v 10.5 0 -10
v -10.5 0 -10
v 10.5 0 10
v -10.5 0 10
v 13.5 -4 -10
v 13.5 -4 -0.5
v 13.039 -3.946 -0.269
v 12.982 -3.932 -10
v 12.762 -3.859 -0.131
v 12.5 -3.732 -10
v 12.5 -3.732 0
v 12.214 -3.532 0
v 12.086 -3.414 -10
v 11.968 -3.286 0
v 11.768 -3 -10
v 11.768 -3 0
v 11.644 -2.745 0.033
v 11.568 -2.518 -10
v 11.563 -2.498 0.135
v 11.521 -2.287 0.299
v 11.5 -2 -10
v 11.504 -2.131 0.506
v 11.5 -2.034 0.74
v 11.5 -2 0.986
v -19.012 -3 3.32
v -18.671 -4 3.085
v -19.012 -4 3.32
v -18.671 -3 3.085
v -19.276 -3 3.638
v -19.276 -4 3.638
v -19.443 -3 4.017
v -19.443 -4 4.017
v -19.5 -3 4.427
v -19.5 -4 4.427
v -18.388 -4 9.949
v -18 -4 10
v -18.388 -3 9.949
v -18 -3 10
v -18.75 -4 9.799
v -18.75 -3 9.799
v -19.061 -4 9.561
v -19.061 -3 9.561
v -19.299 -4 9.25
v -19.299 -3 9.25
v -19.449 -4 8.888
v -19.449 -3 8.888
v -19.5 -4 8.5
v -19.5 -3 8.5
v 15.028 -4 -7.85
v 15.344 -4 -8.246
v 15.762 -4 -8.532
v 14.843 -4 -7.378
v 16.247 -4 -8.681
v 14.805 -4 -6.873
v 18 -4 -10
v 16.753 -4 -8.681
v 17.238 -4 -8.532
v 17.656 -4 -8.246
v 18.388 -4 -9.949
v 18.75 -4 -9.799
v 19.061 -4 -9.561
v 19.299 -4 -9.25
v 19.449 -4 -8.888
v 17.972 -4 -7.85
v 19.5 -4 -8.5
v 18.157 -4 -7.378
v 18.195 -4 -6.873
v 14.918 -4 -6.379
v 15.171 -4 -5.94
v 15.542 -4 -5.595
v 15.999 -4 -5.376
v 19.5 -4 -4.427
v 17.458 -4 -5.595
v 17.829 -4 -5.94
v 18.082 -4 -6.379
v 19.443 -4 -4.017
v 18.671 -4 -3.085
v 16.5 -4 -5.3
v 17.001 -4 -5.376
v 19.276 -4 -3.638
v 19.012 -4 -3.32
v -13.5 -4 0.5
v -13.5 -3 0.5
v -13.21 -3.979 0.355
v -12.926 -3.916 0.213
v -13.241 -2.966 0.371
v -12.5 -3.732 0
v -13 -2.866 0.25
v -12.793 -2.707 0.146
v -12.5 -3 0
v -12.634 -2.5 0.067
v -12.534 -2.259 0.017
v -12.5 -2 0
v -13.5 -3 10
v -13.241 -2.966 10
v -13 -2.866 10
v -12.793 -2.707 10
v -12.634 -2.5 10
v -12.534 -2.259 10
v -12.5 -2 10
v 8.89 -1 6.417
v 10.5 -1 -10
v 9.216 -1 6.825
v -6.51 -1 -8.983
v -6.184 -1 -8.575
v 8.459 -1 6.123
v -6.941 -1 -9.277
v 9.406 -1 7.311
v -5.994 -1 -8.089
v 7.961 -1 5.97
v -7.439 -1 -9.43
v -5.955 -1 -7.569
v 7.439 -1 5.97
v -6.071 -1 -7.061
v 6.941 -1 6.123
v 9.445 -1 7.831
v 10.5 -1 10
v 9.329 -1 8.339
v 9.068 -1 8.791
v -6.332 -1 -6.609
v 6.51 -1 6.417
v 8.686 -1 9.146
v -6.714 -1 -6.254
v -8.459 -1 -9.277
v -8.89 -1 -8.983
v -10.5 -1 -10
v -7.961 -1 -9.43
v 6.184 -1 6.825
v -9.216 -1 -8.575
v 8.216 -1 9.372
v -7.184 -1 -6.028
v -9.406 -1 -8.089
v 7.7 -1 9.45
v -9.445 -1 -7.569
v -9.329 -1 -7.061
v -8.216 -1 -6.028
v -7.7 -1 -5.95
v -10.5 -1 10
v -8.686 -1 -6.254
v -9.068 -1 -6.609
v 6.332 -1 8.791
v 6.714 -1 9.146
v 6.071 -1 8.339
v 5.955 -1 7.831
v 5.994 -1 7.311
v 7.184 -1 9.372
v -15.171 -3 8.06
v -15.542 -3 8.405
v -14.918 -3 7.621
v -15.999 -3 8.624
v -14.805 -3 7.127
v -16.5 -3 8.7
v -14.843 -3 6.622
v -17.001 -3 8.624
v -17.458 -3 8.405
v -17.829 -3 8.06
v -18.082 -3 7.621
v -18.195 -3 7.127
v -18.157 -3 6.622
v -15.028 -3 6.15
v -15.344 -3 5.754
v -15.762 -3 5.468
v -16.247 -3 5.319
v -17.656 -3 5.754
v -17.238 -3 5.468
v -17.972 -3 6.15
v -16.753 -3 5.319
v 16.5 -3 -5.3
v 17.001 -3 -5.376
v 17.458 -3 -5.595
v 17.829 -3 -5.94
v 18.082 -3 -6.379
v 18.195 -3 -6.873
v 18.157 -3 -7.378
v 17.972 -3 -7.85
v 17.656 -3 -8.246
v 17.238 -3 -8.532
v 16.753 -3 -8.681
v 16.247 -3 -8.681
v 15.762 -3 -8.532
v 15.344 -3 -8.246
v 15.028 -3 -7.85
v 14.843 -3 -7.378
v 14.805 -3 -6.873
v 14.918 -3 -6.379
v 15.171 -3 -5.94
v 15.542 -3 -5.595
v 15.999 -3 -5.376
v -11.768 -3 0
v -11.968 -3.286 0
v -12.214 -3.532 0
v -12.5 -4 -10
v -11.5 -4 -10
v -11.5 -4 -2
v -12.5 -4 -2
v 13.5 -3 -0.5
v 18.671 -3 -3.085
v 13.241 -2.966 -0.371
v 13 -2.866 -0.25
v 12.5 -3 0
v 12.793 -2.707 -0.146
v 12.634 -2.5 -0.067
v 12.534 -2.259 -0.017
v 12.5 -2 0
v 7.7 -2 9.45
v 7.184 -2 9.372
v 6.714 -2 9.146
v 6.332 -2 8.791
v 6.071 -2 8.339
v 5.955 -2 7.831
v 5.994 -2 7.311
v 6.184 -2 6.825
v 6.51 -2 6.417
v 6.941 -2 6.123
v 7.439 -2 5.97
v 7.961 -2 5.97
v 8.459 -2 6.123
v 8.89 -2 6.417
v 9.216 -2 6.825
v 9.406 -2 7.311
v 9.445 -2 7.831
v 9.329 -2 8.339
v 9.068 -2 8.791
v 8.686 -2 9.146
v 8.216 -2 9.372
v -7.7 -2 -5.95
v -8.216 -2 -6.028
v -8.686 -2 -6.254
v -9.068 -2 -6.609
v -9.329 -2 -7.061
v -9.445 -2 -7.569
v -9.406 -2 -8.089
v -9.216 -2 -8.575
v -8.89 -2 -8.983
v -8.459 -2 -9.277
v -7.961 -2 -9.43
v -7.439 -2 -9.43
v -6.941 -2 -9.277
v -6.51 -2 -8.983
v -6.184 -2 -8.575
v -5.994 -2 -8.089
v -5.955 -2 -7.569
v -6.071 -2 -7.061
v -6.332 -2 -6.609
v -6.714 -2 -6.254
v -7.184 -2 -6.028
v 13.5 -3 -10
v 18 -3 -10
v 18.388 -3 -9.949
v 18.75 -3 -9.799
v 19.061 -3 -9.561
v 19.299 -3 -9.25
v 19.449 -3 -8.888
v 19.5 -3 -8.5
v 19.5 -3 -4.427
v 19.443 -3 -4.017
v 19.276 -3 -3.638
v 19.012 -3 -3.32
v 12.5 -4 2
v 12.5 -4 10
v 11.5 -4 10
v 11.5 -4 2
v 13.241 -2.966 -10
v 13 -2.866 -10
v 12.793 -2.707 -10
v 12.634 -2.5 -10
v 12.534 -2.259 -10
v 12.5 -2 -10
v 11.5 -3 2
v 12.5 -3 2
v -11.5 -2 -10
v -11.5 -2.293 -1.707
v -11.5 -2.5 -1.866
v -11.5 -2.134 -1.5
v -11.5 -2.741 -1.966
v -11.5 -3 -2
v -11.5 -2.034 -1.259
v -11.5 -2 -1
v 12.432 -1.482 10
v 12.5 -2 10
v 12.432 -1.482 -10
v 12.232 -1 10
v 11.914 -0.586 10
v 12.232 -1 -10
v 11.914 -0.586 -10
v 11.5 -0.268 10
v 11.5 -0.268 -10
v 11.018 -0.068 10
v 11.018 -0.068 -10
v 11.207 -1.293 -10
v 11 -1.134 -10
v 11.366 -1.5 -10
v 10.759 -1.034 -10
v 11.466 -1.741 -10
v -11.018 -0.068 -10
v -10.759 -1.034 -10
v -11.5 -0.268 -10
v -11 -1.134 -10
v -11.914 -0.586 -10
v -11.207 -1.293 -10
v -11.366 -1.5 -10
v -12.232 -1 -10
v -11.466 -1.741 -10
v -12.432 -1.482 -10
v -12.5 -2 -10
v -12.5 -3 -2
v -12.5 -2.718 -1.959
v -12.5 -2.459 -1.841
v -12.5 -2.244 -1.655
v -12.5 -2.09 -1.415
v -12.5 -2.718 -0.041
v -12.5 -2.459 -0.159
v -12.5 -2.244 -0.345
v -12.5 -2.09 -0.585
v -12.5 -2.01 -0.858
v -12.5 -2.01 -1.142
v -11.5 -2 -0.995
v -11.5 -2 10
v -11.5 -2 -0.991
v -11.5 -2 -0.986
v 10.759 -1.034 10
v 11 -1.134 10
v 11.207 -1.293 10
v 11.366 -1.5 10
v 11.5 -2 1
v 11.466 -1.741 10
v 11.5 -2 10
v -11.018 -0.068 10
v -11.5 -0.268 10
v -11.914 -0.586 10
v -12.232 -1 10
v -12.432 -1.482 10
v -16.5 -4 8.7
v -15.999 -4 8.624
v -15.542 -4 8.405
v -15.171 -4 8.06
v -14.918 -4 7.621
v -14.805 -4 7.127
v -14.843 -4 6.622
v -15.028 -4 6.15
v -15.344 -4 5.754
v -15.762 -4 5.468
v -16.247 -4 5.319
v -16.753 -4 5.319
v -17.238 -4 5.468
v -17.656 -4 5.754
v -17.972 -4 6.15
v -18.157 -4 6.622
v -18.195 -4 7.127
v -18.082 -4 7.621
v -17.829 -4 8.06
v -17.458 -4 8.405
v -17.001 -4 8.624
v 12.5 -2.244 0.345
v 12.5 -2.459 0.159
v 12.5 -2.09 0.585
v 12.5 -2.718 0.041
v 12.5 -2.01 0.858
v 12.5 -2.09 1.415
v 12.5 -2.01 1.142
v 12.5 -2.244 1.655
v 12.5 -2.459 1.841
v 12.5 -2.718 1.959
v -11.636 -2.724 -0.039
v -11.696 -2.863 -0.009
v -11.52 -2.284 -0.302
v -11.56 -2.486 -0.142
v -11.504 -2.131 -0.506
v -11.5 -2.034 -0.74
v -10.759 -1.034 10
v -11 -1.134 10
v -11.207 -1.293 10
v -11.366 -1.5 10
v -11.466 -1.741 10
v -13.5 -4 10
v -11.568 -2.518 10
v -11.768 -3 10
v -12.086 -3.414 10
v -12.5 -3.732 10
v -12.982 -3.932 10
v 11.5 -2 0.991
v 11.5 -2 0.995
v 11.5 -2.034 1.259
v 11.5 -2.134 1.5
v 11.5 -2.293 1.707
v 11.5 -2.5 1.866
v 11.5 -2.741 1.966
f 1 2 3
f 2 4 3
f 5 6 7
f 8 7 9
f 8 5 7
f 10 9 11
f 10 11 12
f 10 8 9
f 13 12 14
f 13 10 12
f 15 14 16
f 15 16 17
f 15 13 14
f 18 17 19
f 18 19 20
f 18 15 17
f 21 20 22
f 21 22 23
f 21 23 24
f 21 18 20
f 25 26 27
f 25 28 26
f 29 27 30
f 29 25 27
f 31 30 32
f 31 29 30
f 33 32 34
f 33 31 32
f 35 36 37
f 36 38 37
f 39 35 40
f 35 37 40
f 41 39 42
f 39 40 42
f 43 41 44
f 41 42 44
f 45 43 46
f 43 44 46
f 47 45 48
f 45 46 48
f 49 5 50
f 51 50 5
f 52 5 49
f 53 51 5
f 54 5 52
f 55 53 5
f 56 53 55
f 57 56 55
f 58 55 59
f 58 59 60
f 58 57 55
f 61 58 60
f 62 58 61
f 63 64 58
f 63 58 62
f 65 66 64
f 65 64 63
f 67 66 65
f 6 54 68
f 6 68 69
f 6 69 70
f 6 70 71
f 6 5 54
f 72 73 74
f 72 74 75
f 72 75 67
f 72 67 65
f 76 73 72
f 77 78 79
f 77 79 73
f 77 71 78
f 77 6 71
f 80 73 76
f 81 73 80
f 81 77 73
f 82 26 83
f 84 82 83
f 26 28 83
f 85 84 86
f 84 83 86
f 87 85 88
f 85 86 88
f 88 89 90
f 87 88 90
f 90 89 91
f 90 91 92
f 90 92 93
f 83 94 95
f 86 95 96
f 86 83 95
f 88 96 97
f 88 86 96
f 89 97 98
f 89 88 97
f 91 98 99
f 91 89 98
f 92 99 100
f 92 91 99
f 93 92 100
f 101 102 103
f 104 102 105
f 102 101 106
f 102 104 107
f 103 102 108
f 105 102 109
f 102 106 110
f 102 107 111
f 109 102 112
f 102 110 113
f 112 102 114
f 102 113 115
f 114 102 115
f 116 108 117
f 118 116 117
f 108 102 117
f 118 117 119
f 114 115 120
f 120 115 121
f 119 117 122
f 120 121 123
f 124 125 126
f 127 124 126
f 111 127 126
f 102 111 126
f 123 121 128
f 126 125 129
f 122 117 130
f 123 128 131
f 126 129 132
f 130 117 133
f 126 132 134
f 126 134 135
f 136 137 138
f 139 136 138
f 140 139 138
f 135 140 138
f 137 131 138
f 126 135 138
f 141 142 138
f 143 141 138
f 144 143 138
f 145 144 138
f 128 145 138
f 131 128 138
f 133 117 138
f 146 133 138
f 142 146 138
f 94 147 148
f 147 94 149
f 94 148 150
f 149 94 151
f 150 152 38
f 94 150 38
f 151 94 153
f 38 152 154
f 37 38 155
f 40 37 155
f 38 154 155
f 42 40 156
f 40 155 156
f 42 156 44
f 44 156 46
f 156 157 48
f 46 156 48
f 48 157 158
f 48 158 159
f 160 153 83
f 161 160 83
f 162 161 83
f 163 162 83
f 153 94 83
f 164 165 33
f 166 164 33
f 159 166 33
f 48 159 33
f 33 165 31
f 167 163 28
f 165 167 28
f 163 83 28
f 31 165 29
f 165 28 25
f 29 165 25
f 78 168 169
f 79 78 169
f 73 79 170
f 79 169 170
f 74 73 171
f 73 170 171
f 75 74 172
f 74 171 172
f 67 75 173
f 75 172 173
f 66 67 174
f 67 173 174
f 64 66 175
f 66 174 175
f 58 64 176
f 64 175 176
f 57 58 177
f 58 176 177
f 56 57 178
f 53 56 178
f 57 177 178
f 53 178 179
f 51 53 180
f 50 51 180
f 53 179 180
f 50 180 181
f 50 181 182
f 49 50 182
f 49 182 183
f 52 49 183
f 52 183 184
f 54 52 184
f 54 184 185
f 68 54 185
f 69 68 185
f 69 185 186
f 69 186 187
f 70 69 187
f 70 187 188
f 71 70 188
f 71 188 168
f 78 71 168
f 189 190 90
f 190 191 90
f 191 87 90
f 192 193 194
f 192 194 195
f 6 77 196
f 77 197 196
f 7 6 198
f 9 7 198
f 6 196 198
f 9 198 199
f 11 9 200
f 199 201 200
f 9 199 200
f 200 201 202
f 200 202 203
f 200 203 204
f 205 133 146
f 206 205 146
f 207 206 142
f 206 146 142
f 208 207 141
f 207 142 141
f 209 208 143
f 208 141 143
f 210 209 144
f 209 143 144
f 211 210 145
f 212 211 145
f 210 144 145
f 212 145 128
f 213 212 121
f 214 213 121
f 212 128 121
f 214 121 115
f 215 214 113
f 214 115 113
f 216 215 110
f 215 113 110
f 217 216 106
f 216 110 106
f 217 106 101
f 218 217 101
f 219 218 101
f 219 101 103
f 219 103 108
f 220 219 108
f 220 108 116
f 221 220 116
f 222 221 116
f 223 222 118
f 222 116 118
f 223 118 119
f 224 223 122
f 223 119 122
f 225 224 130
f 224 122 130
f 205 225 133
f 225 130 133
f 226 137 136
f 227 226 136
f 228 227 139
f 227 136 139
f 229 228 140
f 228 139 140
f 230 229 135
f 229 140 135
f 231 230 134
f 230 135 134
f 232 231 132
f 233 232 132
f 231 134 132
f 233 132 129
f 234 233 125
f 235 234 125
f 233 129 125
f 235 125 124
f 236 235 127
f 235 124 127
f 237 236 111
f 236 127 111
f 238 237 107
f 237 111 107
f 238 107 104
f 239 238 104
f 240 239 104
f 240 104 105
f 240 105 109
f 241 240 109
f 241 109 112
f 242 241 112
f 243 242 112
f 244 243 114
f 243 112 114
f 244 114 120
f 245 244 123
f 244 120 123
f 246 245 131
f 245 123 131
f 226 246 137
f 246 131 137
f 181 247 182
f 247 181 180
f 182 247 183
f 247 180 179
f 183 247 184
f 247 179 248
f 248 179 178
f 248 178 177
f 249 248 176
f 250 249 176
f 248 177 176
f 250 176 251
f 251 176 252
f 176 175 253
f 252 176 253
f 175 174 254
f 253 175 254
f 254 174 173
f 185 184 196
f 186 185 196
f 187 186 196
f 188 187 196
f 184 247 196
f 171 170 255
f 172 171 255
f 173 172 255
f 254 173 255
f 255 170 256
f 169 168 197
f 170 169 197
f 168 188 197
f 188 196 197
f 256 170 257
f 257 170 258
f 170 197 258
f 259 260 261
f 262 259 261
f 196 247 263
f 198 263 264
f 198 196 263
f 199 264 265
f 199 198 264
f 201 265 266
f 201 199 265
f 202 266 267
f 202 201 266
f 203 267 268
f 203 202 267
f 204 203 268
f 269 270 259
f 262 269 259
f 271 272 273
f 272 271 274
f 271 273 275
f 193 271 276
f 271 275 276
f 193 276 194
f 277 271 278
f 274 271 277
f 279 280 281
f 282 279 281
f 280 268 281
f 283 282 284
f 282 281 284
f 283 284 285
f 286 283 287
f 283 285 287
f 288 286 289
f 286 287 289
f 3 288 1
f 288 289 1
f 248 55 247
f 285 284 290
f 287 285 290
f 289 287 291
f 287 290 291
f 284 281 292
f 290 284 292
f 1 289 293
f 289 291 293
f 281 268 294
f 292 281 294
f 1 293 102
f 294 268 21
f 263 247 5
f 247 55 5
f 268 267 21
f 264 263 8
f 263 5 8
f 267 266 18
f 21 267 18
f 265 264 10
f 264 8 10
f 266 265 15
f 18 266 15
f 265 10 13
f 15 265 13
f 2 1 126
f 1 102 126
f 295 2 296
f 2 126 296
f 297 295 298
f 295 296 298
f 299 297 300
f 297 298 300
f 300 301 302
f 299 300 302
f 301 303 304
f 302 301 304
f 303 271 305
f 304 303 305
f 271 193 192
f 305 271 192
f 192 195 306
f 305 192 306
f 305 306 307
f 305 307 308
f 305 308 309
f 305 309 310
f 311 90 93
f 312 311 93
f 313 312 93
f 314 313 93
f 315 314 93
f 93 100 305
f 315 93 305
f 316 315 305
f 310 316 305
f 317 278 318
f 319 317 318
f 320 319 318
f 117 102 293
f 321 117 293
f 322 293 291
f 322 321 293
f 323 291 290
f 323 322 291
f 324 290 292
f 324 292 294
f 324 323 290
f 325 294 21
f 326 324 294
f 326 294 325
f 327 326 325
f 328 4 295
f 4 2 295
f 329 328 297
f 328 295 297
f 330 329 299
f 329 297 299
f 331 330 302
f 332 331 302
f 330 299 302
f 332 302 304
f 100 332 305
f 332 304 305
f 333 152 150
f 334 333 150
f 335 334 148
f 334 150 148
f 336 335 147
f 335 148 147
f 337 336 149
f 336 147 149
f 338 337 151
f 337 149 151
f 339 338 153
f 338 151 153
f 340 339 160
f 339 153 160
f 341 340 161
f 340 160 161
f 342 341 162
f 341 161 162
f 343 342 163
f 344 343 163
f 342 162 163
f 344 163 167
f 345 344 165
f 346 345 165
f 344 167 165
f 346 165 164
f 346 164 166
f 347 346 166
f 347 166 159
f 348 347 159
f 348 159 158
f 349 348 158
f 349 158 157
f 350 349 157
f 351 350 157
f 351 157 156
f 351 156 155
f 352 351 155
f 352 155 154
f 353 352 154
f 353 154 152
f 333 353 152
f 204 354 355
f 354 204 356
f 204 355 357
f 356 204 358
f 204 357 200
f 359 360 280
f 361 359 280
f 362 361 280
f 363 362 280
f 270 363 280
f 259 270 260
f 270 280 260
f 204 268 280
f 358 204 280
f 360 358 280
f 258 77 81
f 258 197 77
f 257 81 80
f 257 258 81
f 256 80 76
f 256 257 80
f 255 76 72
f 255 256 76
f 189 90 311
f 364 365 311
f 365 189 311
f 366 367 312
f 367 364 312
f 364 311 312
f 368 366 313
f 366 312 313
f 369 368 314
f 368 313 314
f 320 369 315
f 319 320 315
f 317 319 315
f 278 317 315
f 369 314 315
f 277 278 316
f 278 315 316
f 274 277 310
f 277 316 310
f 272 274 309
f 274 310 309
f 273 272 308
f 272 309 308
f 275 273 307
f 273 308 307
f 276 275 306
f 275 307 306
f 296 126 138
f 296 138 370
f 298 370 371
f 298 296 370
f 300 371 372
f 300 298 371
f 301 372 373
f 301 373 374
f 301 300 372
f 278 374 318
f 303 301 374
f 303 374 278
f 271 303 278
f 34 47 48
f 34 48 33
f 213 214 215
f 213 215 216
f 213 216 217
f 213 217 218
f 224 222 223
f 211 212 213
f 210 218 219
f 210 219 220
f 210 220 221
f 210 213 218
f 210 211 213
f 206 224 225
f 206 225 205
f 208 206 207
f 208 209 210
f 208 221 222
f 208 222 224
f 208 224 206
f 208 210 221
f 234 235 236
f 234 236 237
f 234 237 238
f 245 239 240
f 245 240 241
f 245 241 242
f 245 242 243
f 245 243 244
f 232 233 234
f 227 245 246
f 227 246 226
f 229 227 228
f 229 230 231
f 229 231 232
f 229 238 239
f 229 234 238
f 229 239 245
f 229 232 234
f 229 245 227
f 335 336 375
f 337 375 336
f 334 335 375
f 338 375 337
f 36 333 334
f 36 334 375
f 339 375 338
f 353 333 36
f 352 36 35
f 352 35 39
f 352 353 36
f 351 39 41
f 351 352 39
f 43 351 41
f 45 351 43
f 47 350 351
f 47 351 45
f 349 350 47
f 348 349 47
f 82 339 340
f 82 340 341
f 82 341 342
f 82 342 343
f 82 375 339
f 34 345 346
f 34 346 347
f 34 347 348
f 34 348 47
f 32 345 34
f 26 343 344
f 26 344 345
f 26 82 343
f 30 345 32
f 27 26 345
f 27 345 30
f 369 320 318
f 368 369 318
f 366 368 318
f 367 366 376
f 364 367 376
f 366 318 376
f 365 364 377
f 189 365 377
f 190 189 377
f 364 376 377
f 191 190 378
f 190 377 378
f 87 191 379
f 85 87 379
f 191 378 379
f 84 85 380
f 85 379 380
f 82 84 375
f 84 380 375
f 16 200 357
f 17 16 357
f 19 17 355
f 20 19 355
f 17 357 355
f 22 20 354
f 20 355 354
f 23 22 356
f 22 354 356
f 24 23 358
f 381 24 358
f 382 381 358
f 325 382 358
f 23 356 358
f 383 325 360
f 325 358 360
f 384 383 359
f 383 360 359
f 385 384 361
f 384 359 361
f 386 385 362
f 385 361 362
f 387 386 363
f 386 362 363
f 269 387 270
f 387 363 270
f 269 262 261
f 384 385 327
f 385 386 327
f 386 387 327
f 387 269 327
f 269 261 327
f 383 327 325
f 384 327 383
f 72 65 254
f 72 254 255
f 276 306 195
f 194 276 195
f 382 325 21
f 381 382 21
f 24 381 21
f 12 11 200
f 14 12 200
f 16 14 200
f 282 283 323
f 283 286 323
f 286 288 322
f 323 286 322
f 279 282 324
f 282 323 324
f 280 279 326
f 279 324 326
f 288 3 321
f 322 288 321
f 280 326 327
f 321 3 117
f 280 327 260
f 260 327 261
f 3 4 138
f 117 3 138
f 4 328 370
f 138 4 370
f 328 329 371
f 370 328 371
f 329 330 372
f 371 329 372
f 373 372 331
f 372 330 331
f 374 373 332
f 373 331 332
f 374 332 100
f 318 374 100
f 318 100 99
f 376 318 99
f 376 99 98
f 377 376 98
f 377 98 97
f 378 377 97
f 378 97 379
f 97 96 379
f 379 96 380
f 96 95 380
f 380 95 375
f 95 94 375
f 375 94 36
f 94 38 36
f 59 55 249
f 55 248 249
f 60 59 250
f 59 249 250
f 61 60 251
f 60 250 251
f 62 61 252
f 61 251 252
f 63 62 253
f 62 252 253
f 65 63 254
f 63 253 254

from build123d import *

# Parameters (mm, degrees)
BOSS_EXTRUDE1_DEPTH = 10
CUT_EXTRUDE1_DEPTH  = 1
CIRPATTERN1_COUNT   = 2
CIRPATTERN1_ANGLE   = 180
BOSS_EXTRUDE2_DEPTH = 1
CIRPATTERN2_COUNT   = 2
CIRPATTERN2_ANGLE   = 180
FILLET1_R           = 1.5
FILLET2_R           = 1
FILLET3_R           = 2
SKETCH5_R           = 1.7
CUT_EXTRUDE2_DEPTH  = 23.276669473
SKETCH6_R           = 1.75
BOSS_EXTRUDE3_DEPTH = 1


# Some blends are built 0.0001 mm under size
with BuildPart() as part:
    # Sketch1 → Boss-Extrude1 (new, symmetric)
    with BuildSketch(Plane.XY):
        Polygon((-12.5, -4), (-12.5, 0), (12.5, 0), (12.5, -4), (11.5, -4), (11.5, -1), (-11.5, -1), (-11.5, -4), align=None)
    extrude(amount=BOSS_EXTRUDE1_DEPTH, both=True)

    # Sketch3 → Cut-Extrude1 (cut)
    with BuildSketch(Plane(origin=(12.5, 0, 0), x_dir=(0, 0, -1), z_dir=(1, 0, 0))):
        with BuildLine():
            Line((-2, -3), (-2, -4))
            Line((-2, -4), (0, -4))
            Line((0, -4), (0, -3))
            ThreePointArc((0, -3), (-1, -2), (-2, -3))
        make_face()
    cut_extrude1 = extrude(amount=-CUT_EXTRUDE1_DEPTH, mode=Mode.SUBTRACT)

    # CirPattern1: Cut-Extrude1 ×2 about axis
    cirpattern1_axis = Axis((0, -50, 0), (0, 1, 0))
    for i in range(1, CIRPATTERN1_COUNT):
        add(cut_extrude1.rotate(cirpattern1_axis, i * CIRPATTERN1_ANGLE / (CIRPATTERN1_COUNT - 1)), mode=Mode.SUBTRACT)

    # Sketch4 → Boss-Extrude2 (add)
    with BuildSketch(Plane.XZ.offset(4)):
        Polygon((12.5, -10), (19.5, -10), (19.5, -3.5), (12.5, 0), align=None)
    boss_extrude2 = extrude(amount=-BOSS_EXTRUDE2_DEPTH)

    # CirPattern2: Boss-Extrude2 ×2 about axis
    cirpattern2_axis = Axis((0, 0, 0), (0, 1, 0))
    for i in range(1, CIRPATTERN2_COUNT):
        add(boss_extrude2.rotate(cirpattern2_axis, i * CIRPATTERN2_ANGLE / (CIRPATTERN2_COUNT - 1)))

    # Fillet1
    fillet1_edges = [part.edges().sort_by_distance(p)[0] for p in [
        (19.5, -3.5, -3.5),
        (19.5, -3.5, -10),
        (-19.5, -3.5, 3.5),
        (-19.5, -3.5, 10),
    ]]
    fillet(fillet1_edges, radius=FILLET1_R)

    # Fillet2
    # the kernel refuses this fillet: 1 mm, written as the material it adds along each edge
    with BuildSketch(Plane(origin=(11.5, -1, 10), x_dir=(0, -1, 0), z_dir=(0, 0, -1))) as fillet2_piece_1:
        with BuildLine():
            CenterArc((FILLET2_R, FILLET2_R), FILLET2_R, 180, 90)
            Line((0, FILLET2_R), (0, 0))
            Line((0, 0), (FILLET2_R, 0))
        make_face()
    extrude(amount=20)
    with BuildSketch(Plane(origin=(-11.5, -1, -10), x_dir=(1, 0, 0), z_dir=(0, 0, 1))) as fillet2_piece_2:
        with BuildLine():
            CenterArc((FILLET2_R, -FILLET2_R), FILLET2_R, 90, 90)
            Line((0, -FILLET2_R), (0, 0))
            Line((0, 0), (FILLET2_R, 0))
        make_face()
    extrude(amount=20)
    with BuildSketch(Plane(origin=(-12.5, -3, -2.5), x_dir=(0, 1, 0), z_dir=(0, 0, 1))) as fillet2_piece_3_section:
        with BuildLine():
            CenterArc((FILLET2_R, FILLET2_R), FILLET2_R, 180, 90)
            Line((0, FILLET2_R), (0, 0))
            Line((0, 0), (FILLET2_R, 0))
        make_face()
    fillet2_piece_3 = extrude(amount=12.5, mode=Mode.PRIVATE)
    fillet2_piece_3 = split(fillet2_piece_3, bisect_by=Plane(origin=(-14.699431135, -2.775586215, 1.099715568), z_dir=(0.44721359549996453, 0, 0.8944271909999126)), keep=Keep.TOP, mode=Mode.PRIVATE)
    add(fillet2_piece_3)
    with BuildSketch(Plane(origin=(12.5, -3, 2.5), x_dir=(1, 0, 0), z_dir=(0, 0, -1))) as fillet2_piece_4_section:
        with BuildLine():
            CenterArc((FILLET2_R, -FILLET2_R), FILLET2_R, 90, 90)
            Line((0, -FILLET2_R), (0, 0))
            Line((0, 0), (FILLET2_R, 0))
        make_face()
    fillet2_piece_4 = extrude(amount=12.5, mode=Mode.PRIVATE)
    fillet2_piece_4 = split(fillet2_piece_4, bisect_by=Plane(origin=(14.699431135, -2.775586215, -1.099715568), z_dir=(-0.44721359549995826, 0, -0.8944271909999157)), keep=Keep.TOP, mode=Mode.PRIVATE)
    add(fillet2_piece_4)

    # Fillet3
    fillet3_edges = [part.edges().sort_by_distance(p)[0] for p in [
        (-12.5, 0, 0),
        (12.5, 0, 0),
        (11.5, -4, -5),
        (-11.5, -4, 5),
    ]]
    fillet(fillet3_edges, radius=FILLET3_R - 0.0001)  # a hair under: the kernel refuses the full size

    # Sketch5 → Cut-Extrude2 (cut, through all)
    with BuildSketch(Plane(origin=(0, 0, 0), x_dir=(1, 0, 0), z_dir=(0, 1, 0))):
        with Locations(Location((16.5, 7, 0), (0, 0, 270))):
            Circle(SKETCH5_R)
        with Locations(Location((-16.5, -7, 0), (0, 0, 270))):
            Circle(SKETCH5_R)
    extrude(amount=-CUT_EXTRUDE2_DEPTH, mode=Mode.SUBTRACT)

    # Sketch6 → Boss-Extrude3 (add)
    with BuildSketch(Plane.XZ.offset(1)):
        with Locations(Location((7.7, 7.7, 0), (0, 0, 90))):
            Circle(SKETCH6_R)
        with Locations(Location((-7.7, -7.7, 0), (0, 0, 90))):
            Circle(SKETCH6_R)
    extrude(amount=BOSS_EXTRUDE3_DEPTH)


solid = part.part
